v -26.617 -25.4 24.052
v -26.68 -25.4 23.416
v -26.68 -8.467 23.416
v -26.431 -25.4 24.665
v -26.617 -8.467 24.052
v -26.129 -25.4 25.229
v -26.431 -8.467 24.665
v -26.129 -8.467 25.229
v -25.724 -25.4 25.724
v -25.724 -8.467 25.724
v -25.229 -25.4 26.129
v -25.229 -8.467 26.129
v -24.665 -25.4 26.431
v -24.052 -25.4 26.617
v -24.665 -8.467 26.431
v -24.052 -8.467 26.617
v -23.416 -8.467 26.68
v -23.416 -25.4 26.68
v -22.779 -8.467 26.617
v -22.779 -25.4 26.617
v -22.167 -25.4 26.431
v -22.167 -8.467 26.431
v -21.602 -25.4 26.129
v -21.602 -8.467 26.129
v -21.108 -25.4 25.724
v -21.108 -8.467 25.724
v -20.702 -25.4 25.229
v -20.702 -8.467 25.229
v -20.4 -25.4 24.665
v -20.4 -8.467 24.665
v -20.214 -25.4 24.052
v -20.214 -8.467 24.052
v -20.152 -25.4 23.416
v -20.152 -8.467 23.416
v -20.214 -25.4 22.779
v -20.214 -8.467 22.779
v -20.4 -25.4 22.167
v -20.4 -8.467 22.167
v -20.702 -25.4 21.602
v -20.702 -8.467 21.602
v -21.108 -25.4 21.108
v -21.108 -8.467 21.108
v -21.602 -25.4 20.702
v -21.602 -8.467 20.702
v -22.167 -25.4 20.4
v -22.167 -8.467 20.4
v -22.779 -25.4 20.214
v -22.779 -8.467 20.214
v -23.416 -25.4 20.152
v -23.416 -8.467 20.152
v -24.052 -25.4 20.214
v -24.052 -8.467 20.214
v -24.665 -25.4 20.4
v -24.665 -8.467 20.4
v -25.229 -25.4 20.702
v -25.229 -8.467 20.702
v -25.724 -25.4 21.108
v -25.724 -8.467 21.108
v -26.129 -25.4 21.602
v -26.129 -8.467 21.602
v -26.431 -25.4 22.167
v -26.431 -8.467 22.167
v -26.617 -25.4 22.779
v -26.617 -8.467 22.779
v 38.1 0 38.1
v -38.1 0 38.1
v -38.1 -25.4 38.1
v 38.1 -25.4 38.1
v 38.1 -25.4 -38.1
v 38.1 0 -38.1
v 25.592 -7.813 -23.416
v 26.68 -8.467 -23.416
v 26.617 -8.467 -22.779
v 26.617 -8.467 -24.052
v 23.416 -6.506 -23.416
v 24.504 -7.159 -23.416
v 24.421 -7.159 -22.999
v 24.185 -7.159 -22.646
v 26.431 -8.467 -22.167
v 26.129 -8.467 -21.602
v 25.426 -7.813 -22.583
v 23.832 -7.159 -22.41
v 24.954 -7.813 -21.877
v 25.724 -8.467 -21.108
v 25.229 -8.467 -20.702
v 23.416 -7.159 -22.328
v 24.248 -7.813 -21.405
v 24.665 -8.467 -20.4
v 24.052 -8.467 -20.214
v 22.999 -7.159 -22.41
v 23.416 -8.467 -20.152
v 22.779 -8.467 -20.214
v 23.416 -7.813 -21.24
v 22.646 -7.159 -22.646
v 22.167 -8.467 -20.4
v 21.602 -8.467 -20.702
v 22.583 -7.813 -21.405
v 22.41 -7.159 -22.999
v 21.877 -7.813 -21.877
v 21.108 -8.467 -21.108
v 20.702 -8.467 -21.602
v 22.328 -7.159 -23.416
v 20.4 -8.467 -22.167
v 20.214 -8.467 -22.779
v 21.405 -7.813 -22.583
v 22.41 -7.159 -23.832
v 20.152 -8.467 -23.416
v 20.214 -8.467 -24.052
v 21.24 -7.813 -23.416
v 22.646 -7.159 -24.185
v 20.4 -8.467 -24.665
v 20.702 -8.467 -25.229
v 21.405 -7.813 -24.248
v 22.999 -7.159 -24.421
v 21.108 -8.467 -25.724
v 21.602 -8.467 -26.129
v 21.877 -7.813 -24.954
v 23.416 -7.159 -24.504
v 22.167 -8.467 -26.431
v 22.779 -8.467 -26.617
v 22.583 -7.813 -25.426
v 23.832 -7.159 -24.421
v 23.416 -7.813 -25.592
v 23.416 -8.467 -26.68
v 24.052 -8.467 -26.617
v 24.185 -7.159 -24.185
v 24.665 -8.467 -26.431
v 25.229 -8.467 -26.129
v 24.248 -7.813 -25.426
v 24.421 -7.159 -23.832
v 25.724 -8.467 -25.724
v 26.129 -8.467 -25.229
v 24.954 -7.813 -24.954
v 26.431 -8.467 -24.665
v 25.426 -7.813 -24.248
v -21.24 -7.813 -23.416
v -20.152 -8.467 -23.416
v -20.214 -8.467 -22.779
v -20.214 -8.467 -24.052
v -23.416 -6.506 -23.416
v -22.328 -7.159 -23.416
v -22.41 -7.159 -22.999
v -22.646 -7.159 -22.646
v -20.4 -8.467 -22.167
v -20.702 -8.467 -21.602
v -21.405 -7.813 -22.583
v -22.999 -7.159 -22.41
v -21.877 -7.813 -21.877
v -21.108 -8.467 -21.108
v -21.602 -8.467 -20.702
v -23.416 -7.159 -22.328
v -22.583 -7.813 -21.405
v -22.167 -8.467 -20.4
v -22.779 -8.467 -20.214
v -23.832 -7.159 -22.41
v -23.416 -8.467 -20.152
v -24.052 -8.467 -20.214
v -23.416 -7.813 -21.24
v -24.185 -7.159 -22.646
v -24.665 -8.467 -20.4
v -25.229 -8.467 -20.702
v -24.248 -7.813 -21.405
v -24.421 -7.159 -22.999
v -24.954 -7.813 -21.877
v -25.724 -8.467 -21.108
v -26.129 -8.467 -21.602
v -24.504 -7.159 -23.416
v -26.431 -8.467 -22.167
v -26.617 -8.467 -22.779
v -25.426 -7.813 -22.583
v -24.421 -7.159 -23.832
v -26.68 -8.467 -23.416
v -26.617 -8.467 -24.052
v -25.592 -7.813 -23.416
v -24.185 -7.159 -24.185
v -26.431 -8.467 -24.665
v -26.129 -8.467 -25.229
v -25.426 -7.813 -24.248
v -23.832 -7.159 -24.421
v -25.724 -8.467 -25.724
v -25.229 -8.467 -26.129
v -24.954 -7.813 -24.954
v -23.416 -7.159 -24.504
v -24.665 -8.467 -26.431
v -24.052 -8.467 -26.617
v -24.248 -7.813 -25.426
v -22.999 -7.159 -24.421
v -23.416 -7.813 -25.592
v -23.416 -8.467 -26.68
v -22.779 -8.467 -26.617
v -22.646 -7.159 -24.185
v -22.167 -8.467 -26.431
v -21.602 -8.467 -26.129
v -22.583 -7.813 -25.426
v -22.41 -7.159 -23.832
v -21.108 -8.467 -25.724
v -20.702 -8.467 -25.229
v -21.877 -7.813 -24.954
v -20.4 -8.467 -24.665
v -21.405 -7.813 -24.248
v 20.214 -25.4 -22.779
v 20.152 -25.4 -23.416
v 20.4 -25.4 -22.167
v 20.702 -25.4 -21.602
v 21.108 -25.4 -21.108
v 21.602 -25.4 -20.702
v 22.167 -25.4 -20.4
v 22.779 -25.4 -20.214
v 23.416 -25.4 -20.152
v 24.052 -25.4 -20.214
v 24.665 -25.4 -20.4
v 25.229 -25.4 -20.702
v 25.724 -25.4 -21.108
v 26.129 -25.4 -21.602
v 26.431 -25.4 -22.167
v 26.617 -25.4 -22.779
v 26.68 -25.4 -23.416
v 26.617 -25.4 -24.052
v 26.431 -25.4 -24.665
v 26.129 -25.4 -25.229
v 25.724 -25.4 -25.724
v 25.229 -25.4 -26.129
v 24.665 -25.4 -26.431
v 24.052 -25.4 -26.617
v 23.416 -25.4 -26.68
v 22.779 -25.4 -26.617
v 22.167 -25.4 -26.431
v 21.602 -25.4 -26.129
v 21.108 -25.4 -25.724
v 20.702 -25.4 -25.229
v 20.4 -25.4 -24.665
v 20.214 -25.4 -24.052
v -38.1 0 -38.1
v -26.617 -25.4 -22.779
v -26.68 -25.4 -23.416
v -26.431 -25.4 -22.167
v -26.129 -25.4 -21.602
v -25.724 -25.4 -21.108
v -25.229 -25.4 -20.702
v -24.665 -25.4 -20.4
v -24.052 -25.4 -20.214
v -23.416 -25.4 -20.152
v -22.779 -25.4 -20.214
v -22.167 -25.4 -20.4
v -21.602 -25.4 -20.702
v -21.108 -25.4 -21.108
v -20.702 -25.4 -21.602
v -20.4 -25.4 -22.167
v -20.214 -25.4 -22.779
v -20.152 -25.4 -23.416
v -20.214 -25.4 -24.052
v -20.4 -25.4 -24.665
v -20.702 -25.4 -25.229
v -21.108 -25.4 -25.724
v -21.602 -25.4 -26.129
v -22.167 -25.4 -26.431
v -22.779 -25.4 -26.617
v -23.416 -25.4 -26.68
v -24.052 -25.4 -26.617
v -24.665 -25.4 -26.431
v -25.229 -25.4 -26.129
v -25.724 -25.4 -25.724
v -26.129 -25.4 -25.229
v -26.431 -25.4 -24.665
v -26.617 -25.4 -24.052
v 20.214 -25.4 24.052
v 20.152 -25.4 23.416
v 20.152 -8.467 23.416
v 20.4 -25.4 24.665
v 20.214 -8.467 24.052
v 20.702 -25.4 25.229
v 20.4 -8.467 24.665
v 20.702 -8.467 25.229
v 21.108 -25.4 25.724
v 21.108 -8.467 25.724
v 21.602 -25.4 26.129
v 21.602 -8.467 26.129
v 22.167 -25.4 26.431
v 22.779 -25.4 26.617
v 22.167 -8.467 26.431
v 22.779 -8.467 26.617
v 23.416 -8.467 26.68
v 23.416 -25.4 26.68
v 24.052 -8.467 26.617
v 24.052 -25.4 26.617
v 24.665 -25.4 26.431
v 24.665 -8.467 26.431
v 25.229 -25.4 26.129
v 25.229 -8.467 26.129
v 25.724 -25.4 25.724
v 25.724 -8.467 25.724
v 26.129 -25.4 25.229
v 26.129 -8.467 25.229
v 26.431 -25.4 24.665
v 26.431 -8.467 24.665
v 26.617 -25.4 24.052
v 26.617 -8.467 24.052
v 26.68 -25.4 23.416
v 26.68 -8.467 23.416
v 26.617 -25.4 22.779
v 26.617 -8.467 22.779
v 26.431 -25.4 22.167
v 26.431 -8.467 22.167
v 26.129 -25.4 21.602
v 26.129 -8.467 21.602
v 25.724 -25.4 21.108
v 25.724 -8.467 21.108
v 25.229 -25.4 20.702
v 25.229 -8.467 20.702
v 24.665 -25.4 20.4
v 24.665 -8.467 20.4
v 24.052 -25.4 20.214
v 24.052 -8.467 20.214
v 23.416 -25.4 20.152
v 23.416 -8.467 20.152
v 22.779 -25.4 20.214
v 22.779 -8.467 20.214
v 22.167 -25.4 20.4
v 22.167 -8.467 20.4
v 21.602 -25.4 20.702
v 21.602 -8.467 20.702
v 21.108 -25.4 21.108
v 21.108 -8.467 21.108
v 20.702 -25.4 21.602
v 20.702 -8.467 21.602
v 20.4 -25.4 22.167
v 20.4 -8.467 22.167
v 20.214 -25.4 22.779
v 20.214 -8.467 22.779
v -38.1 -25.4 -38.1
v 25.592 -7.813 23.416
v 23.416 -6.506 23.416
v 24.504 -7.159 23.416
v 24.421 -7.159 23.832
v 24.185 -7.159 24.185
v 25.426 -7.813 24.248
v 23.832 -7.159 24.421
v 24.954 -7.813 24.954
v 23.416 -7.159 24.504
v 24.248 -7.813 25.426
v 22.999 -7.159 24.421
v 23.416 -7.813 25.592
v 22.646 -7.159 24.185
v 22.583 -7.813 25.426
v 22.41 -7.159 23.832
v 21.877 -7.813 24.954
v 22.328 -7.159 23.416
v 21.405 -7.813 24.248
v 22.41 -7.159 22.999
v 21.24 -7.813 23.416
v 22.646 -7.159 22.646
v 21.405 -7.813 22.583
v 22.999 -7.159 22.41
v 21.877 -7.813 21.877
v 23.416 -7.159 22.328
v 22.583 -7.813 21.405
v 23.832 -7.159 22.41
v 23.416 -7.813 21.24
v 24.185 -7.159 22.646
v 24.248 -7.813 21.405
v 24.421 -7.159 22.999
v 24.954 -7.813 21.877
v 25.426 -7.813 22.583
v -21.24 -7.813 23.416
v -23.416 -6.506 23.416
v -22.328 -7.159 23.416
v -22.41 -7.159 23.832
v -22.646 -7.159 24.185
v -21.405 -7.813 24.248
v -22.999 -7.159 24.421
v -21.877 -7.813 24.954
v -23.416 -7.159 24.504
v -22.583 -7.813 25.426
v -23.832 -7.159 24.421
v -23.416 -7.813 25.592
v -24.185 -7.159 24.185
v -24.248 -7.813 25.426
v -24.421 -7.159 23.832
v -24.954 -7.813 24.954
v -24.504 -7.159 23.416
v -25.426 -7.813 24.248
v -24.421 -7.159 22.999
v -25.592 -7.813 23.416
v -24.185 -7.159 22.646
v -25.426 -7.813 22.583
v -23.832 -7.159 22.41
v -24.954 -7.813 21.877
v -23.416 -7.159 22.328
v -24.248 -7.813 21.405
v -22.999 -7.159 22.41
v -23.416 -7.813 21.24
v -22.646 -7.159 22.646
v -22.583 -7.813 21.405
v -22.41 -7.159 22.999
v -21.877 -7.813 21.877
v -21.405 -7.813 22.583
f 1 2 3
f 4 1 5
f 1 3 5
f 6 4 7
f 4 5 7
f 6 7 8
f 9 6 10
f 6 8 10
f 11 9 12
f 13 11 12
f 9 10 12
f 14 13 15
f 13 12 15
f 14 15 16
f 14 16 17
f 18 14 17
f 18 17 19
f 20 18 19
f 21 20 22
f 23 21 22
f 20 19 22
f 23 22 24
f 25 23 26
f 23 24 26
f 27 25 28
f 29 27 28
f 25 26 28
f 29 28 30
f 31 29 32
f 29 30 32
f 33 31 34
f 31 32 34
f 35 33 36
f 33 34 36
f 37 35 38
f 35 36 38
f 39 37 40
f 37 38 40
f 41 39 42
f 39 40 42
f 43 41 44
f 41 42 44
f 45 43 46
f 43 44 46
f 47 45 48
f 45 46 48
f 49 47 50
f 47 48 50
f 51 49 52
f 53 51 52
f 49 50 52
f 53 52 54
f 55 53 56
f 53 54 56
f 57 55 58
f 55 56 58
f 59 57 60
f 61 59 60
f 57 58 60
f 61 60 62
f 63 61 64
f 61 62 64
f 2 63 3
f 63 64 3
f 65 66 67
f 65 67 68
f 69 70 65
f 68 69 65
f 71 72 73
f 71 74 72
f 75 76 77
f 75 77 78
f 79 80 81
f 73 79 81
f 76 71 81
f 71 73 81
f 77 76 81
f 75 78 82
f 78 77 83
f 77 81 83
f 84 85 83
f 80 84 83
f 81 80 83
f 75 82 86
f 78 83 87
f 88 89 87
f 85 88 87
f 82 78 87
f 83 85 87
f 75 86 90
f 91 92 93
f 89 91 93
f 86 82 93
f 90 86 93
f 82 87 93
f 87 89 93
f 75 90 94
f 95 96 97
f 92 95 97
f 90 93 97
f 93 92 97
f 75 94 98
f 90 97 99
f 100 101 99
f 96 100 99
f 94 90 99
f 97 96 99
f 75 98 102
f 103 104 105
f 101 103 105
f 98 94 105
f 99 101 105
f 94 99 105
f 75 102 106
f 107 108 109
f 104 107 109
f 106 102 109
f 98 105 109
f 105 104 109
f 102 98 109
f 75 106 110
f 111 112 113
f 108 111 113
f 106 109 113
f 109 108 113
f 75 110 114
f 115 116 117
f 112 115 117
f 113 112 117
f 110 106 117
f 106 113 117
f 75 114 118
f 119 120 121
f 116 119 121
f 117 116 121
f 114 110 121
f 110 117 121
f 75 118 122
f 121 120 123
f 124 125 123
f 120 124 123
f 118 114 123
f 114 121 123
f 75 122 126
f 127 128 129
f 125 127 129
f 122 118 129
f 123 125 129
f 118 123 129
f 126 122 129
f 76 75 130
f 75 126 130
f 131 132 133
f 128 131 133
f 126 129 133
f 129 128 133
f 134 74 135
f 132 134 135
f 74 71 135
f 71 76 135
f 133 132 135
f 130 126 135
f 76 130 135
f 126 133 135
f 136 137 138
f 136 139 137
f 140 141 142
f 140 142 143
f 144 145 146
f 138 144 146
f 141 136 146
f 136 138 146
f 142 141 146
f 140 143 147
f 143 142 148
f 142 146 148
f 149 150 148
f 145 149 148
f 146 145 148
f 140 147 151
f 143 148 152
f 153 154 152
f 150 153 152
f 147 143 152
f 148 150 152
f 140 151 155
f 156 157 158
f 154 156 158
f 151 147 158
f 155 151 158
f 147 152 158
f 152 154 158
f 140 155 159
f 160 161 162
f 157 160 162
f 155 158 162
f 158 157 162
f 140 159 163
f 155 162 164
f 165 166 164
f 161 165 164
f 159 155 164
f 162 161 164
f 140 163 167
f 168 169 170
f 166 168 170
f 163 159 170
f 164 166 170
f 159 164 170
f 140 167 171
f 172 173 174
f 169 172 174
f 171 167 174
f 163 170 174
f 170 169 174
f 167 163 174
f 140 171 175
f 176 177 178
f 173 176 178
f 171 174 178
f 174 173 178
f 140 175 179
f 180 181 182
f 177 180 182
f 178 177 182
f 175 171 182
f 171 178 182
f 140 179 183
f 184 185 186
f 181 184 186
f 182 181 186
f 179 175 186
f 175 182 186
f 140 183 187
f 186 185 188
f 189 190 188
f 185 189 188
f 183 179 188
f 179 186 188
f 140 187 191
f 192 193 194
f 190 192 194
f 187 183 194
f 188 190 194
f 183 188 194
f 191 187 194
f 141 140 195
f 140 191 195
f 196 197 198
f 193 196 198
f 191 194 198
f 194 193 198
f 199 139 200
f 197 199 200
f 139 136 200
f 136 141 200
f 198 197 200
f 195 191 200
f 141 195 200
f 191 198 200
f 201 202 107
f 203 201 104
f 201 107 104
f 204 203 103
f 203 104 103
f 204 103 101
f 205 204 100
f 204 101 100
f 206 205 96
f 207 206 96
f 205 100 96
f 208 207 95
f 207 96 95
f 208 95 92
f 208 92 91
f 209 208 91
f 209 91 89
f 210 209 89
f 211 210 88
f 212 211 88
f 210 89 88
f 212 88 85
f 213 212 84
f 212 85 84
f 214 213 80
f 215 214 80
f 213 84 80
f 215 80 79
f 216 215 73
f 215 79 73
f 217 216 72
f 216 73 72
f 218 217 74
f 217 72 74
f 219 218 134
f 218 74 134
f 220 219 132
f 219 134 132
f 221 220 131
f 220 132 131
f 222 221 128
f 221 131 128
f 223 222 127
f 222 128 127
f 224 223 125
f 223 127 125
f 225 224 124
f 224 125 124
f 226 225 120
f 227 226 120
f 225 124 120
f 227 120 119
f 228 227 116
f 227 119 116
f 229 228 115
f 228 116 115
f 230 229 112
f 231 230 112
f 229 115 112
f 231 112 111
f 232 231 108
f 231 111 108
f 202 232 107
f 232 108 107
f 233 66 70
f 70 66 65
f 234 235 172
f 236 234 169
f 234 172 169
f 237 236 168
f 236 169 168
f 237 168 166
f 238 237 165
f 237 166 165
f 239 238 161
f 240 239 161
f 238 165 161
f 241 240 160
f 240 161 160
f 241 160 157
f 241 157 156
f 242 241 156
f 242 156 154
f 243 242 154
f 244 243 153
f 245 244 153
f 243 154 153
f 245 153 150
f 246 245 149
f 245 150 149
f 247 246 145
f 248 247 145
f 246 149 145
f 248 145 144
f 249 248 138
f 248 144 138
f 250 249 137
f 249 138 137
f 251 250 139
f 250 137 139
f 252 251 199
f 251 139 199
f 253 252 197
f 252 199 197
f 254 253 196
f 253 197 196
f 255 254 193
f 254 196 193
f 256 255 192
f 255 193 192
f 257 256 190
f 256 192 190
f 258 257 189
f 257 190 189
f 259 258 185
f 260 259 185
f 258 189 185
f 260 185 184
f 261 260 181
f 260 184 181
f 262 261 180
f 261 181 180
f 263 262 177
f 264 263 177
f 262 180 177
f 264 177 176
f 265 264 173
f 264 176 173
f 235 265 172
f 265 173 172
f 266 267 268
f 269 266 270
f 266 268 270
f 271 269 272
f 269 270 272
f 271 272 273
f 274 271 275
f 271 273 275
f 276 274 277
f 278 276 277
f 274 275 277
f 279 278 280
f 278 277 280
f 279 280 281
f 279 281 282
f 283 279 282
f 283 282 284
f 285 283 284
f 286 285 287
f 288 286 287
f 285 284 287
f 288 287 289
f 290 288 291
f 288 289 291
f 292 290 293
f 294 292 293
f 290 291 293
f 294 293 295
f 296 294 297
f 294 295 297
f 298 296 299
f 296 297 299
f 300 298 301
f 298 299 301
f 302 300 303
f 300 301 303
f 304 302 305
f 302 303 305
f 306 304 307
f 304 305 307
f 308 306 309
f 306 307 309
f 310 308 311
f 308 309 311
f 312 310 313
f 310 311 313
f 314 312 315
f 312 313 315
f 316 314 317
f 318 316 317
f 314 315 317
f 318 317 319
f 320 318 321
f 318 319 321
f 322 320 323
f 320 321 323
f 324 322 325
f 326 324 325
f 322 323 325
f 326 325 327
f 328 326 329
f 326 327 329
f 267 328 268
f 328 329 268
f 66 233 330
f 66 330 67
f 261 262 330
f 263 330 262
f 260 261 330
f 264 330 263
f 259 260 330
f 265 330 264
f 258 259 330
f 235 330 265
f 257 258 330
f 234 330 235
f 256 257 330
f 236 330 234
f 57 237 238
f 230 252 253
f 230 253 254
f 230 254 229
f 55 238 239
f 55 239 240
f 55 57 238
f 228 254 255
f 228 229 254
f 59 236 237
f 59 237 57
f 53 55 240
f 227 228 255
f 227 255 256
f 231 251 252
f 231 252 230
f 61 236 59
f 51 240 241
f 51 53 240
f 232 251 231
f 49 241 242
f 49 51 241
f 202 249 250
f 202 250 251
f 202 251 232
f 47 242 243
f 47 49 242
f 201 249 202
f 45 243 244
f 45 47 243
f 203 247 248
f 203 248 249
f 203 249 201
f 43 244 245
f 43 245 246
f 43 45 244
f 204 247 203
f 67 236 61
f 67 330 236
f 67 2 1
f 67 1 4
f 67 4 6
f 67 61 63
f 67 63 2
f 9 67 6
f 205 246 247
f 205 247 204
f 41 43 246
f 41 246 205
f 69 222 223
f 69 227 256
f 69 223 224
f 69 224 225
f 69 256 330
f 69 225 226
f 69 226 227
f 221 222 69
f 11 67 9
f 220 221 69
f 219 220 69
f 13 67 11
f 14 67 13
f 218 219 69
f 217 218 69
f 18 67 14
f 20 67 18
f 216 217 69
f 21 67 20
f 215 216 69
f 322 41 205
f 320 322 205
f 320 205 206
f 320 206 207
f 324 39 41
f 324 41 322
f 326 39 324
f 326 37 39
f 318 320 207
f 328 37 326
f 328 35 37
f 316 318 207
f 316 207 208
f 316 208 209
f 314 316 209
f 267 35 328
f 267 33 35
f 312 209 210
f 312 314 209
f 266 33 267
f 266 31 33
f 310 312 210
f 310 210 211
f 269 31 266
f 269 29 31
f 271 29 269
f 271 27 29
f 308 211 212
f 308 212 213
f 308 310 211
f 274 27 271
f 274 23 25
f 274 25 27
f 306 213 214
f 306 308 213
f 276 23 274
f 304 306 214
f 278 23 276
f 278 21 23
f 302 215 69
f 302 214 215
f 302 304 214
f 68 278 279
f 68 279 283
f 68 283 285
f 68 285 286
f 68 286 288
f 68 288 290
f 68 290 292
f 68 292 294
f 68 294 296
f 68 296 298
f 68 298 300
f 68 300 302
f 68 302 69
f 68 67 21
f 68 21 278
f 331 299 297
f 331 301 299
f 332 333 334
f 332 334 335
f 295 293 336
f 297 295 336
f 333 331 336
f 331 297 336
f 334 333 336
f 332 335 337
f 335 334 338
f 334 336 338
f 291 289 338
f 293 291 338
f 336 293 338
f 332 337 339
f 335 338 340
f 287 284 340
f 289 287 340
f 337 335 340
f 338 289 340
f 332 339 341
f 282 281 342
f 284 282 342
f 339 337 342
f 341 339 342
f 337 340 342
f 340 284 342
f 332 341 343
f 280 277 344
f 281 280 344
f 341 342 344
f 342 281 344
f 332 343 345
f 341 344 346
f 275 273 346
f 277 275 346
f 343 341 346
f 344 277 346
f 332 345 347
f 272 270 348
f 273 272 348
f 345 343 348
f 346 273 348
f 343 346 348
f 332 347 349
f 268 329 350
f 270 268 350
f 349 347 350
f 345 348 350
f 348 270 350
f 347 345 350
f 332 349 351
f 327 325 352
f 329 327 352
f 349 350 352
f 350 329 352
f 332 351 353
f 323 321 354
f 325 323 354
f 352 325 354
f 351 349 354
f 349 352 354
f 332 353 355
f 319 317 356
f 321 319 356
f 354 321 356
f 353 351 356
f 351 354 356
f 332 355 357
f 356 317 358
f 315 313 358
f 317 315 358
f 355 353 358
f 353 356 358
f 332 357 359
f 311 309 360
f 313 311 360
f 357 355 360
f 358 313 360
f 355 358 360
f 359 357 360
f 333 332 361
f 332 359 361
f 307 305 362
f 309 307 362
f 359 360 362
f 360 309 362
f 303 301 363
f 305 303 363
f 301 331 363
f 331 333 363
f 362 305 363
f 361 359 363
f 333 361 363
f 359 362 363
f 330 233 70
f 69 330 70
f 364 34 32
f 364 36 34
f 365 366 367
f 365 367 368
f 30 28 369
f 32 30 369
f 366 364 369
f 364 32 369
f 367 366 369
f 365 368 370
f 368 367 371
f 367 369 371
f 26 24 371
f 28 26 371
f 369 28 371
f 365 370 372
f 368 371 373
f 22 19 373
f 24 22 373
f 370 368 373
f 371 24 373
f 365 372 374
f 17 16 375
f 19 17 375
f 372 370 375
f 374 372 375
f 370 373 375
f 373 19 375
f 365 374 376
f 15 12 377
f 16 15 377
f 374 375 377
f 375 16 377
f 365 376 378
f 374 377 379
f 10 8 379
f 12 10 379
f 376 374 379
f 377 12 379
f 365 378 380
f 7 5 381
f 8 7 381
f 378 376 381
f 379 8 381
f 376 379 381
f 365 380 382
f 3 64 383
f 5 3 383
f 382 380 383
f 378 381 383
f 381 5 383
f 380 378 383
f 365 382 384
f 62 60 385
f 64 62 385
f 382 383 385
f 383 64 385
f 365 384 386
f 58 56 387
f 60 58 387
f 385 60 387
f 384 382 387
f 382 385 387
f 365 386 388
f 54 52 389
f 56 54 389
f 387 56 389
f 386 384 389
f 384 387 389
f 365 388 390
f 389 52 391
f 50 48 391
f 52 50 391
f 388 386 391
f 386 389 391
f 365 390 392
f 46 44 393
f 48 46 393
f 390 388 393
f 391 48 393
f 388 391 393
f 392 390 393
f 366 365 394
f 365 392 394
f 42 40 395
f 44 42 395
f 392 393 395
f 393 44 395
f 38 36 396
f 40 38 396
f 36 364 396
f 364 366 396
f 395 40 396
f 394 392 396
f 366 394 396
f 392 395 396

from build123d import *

# Parameters (mm, degrees)
F0_W     = 76.2
F0_H     = 76.2
F1_DEPTH = 25.4
F3_D     = 6.5278
F3_DEPTH = 16.9333333333
F3_TIP   = 1.9611489744


with BuildPart() as f1:
    # F0 (on Front) → F1 (new body)
    with BuildSketch(Plane.XZ):
        Rectangle(F0_W, F0_H)
    extrude(amount=F1_DEPTH)

    # F3
    with Locations(Plane.XZ.offset(25.4)):
        with Locations((-23.415625, 23.415625), (23.415625, 23.415625), (23.415625, -23.415625), (-23.415625, -23.415625)):
            Hole(F3_D / 2, depth=F3_DEPTH)
            with Locations((0, 0, -(F3_DEPTH + F3_TIP / 2))):  # 118° drill point
                Cone(0, F3_D / 2, F3_TIP, mode=Mode.SUBTRACT)


solid = f1.part
